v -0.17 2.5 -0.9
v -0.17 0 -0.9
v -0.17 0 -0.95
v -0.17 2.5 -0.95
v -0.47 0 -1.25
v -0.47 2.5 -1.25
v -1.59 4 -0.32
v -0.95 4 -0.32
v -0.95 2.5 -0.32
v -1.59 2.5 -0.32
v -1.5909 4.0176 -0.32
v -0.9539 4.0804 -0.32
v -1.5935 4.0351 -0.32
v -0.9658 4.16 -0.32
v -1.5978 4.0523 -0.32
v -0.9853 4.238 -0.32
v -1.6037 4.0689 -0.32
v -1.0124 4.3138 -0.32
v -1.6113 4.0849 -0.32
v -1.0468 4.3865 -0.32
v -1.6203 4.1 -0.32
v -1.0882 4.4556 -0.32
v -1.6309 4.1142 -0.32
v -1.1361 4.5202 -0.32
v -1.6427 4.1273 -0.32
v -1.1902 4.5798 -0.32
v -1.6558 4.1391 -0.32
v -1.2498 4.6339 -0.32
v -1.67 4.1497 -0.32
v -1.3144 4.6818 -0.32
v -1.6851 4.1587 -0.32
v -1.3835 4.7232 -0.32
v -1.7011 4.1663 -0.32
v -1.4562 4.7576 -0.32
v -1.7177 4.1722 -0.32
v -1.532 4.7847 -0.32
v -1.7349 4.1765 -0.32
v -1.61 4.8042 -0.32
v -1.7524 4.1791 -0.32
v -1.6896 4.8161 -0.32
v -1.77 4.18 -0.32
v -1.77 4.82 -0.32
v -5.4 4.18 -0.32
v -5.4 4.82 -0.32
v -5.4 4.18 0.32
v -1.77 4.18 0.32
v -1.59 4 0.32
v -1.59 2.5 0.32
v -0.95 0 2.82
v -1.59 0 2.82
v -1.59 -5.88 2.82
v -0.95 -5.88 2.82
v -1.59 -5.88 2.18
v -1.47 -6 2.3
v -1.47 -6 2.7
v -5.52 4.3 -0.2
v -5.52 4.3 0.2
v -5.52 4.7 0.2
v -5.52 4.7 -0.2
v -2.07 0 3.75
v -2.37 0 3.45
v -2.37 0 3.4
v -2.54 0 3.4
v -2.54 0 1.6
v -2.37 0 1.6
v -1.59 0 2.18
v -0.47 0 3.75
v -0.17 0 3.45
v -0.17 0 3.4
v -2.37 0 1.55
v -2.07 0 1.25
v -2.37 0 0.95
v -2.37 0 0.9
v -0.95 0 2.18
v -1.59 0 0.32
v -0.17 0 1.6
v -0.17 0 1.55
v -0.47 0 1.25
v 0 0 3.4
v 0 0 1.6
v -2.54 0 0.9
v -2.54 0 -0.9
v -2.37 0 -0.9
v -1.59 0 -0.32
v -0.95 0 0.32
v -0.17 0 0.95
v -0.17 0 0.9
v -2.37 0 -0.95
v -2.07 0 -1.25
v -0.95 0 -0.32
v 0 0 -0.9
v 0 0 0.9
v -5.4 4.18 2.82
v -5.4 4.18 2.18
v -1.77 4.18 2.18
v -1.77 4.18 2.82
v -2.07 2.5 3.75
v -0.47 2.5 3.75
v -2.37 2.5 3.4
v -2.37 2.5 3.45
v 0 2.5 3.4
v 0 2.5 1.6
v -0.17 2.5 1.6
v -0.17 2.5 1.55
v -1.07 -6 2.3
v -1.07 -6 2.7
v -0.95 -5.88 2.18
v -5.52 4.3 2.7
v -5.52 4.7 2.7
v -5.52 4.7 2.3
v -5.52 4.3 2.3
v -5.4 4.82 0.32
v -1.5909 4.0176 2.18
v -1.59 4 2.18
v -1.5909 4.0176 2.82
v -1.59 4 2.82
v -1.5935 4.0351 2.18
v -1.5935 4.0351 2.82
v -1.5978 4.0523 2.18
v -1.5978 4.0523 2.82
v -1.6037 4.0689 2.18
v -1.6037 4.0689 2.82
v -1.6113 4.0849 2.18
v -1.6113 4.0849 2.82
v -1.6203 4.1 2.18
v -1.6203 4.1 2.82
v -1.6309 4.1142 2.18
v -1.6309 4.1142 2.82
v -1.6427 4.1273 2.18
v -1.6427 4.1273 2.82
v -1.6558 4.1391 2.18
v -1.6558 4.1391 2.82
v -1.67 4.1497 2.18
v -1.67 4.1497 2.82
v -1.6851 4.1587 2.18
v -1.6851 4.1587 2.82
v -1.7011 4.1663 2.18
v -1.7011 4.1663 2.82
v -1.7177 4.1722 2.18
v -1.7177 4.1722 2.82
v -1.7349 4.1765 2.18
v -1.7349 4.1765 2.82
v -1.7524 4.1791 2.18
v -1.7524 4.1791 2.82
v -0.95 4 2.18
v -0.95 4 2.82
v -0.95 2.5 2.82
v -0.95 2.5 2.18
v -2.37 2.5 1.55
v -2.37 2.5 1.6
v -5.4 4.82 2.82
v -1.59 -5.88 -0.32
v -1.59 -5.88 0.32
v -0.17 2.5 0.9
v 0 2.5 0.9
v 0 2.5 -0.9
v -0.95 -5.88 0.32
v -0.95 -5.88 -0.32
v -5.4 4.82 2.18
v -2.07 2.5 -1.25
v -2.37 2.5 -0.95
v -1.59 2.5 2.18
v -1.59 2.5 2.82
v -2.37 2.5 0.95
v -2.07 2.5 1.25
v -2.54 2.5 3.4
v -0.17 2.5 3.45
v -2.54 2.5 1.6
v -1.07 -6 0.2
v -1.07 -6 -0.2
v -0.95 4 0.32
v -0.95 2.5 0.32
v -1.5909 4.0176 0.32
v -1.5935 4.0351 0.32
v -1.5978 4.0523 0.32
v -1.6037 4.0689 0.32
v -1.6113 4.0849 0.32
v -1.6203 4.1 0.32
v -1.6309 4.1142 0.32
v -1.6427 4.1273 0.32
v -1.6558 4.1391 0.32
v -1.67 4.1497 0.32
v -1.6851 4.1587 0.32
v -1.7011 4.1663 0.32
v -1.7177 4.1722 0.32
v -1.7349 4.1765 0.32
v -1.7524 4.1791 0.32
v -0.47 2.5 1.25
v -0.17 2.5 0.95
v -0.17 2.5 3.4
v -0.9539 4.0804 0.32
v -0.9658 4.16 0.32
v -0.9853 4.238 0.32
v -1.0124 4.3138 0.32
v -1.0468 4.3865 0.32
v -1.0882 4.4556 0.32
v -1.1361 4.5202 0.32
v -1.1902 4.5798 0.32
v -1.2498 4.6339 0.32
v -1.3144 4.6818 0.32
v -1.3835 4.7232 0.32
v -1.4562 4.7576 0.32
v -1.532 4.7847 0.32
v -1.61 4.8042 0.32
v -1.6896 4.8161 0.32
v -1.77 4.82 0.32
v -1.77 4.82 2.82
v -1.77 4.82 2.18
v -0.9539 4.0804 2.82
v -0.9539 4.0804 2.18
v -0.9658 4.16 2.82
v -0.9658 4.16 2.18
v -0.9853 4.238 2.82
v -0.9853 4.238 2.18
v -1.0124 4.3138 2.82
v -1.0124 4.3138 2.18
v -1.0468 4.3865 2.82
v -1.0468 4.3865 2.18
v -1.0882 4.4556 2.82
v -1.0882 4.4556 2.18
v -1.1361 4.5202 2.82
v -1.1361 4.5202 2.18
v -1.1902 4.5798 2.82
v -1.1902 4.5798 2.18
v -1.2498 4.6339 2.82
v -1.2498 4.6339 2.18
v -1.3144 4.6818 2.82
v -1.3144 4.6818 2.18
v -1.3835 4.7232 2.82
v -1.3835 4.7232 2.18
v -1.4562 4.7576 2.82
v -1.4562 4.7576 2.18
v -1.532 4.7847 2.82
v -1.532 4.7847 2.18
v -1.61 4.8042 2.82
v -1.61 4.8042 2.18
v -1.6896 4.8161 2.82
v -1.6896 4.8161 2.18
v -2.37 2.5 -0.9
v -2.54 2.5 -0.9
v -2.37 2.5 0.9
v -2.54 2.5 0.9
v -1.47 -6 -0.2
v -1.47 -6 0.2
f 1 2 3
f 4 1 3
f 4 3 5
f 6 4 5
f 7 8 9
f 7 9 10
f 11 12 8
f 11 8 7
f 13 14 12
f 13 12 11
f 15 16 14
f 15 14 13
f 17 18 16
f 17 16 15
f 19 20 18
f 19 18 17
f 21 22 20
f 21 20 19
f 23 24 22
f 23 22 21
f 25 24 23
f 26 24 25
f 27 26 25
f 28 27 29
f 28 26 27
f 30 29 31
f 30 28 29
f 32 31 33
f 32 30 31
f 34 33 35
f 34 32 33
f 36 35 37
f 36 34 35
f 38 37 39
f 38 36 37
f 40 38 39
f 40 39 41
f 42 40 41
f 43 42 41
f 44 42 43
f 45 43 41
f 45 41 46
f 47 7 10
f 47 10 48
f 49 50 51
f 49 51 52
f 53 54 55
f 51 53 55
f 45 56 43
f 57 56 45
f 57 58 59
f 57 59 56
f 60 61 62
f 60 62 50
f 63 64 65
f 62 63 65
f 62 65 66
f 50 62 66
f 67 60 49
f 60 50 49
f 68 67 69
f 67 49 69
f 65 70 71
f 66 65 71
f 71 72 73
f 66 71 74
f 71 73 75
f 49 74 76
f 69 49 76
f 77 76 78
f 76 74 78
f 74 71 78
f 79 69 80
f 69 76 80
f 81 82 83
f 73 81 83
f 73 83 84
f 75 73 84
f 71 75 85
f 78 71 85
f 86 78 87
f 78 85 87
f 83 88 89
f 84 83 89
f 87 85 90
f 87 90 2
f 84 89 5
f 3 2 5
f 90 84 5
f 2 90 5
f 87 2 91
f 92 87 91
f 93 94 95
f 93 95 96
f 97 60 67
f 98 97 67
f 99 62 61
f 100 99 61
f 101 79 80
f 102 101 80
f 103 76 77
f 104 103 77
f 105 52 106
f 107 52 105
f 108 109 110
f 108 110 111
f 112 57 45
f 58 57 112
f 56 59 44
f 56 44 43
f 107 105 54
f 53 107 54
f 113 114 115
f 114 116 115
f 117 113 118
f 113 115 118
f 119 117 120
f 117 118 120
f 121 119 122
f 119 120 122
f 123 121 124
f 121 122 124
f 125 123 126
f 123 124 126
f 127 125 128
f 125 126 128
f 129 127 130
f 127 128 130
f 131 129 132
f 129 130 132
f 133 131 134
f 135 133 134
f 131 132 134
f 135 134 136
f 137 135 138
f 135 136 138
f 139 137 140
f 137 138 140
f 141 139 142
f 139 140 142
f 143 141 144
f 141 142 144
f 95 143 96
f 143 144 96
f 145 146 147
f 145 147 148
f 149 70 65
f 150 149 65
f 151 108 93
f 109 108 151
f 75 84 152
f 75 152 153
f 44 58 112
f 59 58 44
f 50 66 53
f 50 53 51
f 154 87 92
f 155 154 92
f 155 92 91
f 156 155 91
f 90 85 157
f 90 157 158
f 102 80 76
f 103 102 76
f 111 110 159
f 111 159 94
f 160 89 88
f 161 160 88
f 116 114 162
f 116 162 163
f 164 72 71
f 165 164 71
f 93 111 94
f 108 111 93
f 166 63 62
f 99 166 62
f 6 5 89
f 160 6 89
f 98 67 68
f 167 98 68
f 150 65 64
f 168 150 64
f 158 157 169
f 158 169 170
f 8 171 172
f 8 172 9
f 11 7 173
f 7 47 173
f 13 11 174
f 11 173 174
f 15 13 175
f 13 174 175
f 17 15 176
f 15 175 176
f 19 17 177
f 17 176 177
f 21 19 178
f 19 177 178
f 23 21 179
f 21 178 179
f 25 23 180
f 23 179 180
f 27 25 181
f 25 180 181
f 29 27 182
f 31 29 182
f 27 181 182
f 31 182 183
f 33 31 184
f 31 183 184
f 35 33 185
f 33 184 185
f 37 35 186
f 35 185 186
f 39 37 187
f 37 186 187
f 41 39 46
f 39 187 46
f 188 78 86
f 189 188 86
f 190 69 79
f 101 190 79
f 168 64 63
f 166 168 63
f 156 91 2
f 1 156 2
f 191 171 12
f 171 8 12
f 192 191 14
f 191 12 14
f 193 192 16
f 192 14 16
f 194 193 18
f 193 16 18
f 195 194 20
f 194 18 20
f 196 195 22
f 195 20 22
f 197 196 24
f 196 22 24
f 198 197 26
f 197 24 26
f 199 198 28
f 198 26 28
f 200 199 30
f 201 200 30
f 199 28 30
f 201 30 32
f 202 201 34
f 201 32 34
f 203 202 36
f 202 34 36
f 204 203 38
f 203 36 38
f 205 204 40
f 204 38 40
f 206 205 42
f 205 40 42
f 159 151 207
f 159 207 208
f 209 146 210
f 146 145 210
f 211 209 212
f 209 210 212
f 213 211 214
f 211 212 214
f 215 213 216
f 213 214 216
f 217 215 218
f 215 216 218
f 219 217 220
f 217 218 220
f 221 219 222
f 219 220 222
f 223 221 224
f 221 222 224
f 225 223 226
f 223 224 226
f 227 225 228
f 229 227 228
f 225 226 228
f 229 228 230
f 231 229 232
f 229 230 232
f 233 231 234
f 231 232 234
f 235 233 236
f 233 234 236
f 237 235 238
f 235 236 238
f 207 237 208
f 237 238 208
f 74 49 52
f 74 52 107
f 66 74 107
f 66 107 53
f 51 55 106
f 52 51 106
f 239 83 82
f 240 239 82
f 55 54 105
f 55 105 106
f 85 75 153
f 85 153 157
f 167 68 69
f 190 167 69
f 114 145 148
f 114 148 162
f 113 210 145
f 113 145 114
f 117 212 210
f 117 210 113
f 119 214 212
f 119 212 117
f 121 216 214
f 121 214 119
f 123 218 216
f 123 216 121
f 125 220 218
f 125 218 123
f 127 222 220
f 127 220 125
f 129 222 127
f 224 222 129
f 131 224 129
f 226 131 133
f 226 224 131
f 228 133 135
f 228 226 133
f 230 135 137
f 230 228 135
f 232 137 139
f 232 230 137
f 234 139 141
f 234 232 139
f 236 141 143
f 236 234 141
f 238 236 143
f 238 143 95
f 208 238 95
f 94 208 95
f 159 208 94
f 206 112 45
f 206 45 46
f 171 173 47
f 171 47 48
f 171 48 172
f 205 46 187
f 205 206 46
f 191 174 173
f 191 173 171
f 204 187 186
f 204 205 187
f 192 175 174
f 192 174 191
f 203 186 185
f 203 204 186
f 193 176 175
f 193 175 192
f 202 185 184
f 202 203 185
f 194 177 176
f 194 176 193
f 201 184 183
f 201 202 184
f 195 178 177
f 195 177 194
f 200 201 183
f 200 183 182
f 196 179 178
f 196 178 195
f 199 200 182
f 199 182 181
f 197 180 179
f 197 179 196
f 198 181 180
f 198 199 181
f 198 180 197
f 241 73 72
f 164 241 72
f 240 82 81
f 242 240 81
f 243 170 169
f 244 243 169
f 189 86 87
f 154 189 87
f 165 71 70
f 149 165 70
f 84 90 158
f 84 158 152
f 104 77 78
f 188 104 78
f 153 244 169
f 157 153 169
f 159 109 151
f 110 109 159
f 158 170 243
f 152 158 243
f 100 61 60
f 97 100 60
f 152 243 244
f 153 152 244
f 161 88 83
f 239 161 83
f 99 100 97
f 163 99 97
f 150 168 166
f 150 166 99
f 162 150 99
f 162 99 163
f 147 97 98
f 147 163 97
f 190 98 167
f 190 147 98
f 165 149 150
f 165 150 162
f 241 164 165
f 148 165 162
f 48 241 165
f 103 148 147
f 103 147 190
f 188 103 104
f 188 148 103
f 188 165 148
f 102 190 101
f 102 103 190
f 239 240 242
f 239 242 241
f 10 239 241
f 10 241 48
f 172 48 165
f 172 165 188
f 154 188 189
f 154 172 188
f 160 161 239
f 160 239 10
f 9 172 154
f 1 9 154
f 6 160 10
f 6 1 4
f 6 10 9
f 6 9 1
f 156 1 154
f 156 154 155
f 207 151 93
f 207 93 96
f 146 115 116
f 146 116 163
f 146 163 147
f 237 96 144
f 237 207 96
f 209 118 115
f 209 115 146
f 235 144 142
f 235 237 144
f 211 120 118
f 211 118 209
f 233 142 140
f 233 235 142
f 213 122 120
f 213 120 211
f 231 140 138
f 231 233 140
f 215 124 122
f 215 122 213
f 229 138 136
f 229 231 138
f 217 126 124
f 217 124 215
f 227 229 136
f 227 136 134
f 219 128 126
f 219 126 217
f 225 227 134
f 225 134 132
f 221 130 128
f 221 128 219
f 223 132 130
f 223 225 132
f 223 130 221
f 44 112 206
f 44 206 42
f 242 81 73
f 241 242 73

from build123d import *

# Parameters (mm, degrees)
BOSS_EXTRUDE1_DEPTH        = 2.5
SKETCH6_W                  = 0.64
SKETCH6_H                  = 0.64
CUT_EXTRUDE1_DEPTH         = 2.5
SKETCH15_W                 = 0.64
SKETCH15_H                 = 0.64
CHAMFER4_SIZE              = 0.12
LPATTERN5_COUNT            = 2
LPATTERN5_PITCH            = 2.5
CHAMFER4_OF_LPATTERN5_SIZE = 0.12


with BuildPart() as part:
    # Sketch4 → Boss-Extrude1 (new body)
    with BuildSketch(Plane(origin=(0, 0, 0), x_dir=(1, 0, 0), z_dir=(0, 1, 0))):
        Polygon((-2.37, -0.9), (-2.37, -0.95), (-2.07, -1.25), (-0.47, -1.25), (-0.17, -0.95), (-0.17, -0.9), (0, -0.9), (0, 0.9), (-0.17, 0.9), (-0.17, 0.95), (-0.47, 1.25), (-2.07, 1.25), (-2.37, 0.95), (-2.37, 0.9), (-2.54, 0.9), (-2.54, -0.9), align=None)
    boss_extrude1 = extrude(amount=BOSS_EXTRUDE1_DEPTH)

    # Sketch6 → Cut-Extrude1 (cut)
    with BuildSketch(Plane.XZ):
        with Locations((-1.27, 0)):
            Rectangle(SKETCH6_W, SKETCH6_H)
        with Locations((1.27, 0)):
            Rectangle(SKETCH6_W, SKETCH6_H)
    extrude(amount=-CUT_EXTRUDE1_DEPTH, mode=Mode.SUBTRACT)

    # Sweep1: sweep along a path in Sketch17
    with BuildLine(Plane(origin=(0, 0, 0), x_dir=(1, 0, 0), z_dir=(0, 0, -1))) as sweep1_path:
        Line((-1.27, 6), (-1.27, -4))
        ThreePointArc((-1.27, -4), (-1.416446609, -4.353553391), (-1.77, -4.5))
        Line((-1.77, -4.5), (-5.52, -4.5))
    # Sketch15 → Sweep1 (sweep)
    with BuildSketch(Plane(origin=(0, -6, 0), x_dir=(1, 0, 0), z_dir=(0, 1, 0))):
        with Locations((-1.27, 0)):
            Rectangle(SKETCH15_W, SKETCH15_H)
    sweep1 = sweep(path=sweep1_path.line)

    # Chamfer4
    chamfer4_edges = [part.edges().sort_by_distance(p)[0] for p in [
        (-0.95, -6, 0),
        (-1.59, -6, 0),
        (-1.27, -6, -0.32),
        (-1.27, -6, 0.32),
        (-5.52, 4.18, 0),
        (-5.52, 4.5, 0.32),
        (-5.52, 4.82, 0),
        (-5.52, 4.5, -0.32),
    ]]
    chamfer(chamfer4_edges, length=CHAMFER4_SIZE)

    # LPattern5: Boss-Extrude1, Sweep1 ×2
    with Locations(*[(0, 0, i * LPATTERN5_PITCH) for i in range(1, LPATTERN5_COUNT)]):
        add(boss_extrude1)
        add(sweep1)

    # Chamfer4 of LPattern5
    chamfer4_of_lpattern5_edges = [part.edges().sort_by_distance(p)[0] for p in [
        (-0.95, -6, 2.5),
        (-1.59, -6, 2.5),
        (-1.27, -6, 2.18),
        (-1.27, -6, 2.82),
        (-5.52, 4.18, 2.5),
        (-5.52, 4.5, 2.82),
        (-5.52, 4.82, 2.5),
        (-5.52, 4.5, 2.18),
    ]]
    chamfer(chamfer4_of_lpattern5_edges, length=CHAMFER4_OF_LPATTERN5_SIZE)


solid = part.part
